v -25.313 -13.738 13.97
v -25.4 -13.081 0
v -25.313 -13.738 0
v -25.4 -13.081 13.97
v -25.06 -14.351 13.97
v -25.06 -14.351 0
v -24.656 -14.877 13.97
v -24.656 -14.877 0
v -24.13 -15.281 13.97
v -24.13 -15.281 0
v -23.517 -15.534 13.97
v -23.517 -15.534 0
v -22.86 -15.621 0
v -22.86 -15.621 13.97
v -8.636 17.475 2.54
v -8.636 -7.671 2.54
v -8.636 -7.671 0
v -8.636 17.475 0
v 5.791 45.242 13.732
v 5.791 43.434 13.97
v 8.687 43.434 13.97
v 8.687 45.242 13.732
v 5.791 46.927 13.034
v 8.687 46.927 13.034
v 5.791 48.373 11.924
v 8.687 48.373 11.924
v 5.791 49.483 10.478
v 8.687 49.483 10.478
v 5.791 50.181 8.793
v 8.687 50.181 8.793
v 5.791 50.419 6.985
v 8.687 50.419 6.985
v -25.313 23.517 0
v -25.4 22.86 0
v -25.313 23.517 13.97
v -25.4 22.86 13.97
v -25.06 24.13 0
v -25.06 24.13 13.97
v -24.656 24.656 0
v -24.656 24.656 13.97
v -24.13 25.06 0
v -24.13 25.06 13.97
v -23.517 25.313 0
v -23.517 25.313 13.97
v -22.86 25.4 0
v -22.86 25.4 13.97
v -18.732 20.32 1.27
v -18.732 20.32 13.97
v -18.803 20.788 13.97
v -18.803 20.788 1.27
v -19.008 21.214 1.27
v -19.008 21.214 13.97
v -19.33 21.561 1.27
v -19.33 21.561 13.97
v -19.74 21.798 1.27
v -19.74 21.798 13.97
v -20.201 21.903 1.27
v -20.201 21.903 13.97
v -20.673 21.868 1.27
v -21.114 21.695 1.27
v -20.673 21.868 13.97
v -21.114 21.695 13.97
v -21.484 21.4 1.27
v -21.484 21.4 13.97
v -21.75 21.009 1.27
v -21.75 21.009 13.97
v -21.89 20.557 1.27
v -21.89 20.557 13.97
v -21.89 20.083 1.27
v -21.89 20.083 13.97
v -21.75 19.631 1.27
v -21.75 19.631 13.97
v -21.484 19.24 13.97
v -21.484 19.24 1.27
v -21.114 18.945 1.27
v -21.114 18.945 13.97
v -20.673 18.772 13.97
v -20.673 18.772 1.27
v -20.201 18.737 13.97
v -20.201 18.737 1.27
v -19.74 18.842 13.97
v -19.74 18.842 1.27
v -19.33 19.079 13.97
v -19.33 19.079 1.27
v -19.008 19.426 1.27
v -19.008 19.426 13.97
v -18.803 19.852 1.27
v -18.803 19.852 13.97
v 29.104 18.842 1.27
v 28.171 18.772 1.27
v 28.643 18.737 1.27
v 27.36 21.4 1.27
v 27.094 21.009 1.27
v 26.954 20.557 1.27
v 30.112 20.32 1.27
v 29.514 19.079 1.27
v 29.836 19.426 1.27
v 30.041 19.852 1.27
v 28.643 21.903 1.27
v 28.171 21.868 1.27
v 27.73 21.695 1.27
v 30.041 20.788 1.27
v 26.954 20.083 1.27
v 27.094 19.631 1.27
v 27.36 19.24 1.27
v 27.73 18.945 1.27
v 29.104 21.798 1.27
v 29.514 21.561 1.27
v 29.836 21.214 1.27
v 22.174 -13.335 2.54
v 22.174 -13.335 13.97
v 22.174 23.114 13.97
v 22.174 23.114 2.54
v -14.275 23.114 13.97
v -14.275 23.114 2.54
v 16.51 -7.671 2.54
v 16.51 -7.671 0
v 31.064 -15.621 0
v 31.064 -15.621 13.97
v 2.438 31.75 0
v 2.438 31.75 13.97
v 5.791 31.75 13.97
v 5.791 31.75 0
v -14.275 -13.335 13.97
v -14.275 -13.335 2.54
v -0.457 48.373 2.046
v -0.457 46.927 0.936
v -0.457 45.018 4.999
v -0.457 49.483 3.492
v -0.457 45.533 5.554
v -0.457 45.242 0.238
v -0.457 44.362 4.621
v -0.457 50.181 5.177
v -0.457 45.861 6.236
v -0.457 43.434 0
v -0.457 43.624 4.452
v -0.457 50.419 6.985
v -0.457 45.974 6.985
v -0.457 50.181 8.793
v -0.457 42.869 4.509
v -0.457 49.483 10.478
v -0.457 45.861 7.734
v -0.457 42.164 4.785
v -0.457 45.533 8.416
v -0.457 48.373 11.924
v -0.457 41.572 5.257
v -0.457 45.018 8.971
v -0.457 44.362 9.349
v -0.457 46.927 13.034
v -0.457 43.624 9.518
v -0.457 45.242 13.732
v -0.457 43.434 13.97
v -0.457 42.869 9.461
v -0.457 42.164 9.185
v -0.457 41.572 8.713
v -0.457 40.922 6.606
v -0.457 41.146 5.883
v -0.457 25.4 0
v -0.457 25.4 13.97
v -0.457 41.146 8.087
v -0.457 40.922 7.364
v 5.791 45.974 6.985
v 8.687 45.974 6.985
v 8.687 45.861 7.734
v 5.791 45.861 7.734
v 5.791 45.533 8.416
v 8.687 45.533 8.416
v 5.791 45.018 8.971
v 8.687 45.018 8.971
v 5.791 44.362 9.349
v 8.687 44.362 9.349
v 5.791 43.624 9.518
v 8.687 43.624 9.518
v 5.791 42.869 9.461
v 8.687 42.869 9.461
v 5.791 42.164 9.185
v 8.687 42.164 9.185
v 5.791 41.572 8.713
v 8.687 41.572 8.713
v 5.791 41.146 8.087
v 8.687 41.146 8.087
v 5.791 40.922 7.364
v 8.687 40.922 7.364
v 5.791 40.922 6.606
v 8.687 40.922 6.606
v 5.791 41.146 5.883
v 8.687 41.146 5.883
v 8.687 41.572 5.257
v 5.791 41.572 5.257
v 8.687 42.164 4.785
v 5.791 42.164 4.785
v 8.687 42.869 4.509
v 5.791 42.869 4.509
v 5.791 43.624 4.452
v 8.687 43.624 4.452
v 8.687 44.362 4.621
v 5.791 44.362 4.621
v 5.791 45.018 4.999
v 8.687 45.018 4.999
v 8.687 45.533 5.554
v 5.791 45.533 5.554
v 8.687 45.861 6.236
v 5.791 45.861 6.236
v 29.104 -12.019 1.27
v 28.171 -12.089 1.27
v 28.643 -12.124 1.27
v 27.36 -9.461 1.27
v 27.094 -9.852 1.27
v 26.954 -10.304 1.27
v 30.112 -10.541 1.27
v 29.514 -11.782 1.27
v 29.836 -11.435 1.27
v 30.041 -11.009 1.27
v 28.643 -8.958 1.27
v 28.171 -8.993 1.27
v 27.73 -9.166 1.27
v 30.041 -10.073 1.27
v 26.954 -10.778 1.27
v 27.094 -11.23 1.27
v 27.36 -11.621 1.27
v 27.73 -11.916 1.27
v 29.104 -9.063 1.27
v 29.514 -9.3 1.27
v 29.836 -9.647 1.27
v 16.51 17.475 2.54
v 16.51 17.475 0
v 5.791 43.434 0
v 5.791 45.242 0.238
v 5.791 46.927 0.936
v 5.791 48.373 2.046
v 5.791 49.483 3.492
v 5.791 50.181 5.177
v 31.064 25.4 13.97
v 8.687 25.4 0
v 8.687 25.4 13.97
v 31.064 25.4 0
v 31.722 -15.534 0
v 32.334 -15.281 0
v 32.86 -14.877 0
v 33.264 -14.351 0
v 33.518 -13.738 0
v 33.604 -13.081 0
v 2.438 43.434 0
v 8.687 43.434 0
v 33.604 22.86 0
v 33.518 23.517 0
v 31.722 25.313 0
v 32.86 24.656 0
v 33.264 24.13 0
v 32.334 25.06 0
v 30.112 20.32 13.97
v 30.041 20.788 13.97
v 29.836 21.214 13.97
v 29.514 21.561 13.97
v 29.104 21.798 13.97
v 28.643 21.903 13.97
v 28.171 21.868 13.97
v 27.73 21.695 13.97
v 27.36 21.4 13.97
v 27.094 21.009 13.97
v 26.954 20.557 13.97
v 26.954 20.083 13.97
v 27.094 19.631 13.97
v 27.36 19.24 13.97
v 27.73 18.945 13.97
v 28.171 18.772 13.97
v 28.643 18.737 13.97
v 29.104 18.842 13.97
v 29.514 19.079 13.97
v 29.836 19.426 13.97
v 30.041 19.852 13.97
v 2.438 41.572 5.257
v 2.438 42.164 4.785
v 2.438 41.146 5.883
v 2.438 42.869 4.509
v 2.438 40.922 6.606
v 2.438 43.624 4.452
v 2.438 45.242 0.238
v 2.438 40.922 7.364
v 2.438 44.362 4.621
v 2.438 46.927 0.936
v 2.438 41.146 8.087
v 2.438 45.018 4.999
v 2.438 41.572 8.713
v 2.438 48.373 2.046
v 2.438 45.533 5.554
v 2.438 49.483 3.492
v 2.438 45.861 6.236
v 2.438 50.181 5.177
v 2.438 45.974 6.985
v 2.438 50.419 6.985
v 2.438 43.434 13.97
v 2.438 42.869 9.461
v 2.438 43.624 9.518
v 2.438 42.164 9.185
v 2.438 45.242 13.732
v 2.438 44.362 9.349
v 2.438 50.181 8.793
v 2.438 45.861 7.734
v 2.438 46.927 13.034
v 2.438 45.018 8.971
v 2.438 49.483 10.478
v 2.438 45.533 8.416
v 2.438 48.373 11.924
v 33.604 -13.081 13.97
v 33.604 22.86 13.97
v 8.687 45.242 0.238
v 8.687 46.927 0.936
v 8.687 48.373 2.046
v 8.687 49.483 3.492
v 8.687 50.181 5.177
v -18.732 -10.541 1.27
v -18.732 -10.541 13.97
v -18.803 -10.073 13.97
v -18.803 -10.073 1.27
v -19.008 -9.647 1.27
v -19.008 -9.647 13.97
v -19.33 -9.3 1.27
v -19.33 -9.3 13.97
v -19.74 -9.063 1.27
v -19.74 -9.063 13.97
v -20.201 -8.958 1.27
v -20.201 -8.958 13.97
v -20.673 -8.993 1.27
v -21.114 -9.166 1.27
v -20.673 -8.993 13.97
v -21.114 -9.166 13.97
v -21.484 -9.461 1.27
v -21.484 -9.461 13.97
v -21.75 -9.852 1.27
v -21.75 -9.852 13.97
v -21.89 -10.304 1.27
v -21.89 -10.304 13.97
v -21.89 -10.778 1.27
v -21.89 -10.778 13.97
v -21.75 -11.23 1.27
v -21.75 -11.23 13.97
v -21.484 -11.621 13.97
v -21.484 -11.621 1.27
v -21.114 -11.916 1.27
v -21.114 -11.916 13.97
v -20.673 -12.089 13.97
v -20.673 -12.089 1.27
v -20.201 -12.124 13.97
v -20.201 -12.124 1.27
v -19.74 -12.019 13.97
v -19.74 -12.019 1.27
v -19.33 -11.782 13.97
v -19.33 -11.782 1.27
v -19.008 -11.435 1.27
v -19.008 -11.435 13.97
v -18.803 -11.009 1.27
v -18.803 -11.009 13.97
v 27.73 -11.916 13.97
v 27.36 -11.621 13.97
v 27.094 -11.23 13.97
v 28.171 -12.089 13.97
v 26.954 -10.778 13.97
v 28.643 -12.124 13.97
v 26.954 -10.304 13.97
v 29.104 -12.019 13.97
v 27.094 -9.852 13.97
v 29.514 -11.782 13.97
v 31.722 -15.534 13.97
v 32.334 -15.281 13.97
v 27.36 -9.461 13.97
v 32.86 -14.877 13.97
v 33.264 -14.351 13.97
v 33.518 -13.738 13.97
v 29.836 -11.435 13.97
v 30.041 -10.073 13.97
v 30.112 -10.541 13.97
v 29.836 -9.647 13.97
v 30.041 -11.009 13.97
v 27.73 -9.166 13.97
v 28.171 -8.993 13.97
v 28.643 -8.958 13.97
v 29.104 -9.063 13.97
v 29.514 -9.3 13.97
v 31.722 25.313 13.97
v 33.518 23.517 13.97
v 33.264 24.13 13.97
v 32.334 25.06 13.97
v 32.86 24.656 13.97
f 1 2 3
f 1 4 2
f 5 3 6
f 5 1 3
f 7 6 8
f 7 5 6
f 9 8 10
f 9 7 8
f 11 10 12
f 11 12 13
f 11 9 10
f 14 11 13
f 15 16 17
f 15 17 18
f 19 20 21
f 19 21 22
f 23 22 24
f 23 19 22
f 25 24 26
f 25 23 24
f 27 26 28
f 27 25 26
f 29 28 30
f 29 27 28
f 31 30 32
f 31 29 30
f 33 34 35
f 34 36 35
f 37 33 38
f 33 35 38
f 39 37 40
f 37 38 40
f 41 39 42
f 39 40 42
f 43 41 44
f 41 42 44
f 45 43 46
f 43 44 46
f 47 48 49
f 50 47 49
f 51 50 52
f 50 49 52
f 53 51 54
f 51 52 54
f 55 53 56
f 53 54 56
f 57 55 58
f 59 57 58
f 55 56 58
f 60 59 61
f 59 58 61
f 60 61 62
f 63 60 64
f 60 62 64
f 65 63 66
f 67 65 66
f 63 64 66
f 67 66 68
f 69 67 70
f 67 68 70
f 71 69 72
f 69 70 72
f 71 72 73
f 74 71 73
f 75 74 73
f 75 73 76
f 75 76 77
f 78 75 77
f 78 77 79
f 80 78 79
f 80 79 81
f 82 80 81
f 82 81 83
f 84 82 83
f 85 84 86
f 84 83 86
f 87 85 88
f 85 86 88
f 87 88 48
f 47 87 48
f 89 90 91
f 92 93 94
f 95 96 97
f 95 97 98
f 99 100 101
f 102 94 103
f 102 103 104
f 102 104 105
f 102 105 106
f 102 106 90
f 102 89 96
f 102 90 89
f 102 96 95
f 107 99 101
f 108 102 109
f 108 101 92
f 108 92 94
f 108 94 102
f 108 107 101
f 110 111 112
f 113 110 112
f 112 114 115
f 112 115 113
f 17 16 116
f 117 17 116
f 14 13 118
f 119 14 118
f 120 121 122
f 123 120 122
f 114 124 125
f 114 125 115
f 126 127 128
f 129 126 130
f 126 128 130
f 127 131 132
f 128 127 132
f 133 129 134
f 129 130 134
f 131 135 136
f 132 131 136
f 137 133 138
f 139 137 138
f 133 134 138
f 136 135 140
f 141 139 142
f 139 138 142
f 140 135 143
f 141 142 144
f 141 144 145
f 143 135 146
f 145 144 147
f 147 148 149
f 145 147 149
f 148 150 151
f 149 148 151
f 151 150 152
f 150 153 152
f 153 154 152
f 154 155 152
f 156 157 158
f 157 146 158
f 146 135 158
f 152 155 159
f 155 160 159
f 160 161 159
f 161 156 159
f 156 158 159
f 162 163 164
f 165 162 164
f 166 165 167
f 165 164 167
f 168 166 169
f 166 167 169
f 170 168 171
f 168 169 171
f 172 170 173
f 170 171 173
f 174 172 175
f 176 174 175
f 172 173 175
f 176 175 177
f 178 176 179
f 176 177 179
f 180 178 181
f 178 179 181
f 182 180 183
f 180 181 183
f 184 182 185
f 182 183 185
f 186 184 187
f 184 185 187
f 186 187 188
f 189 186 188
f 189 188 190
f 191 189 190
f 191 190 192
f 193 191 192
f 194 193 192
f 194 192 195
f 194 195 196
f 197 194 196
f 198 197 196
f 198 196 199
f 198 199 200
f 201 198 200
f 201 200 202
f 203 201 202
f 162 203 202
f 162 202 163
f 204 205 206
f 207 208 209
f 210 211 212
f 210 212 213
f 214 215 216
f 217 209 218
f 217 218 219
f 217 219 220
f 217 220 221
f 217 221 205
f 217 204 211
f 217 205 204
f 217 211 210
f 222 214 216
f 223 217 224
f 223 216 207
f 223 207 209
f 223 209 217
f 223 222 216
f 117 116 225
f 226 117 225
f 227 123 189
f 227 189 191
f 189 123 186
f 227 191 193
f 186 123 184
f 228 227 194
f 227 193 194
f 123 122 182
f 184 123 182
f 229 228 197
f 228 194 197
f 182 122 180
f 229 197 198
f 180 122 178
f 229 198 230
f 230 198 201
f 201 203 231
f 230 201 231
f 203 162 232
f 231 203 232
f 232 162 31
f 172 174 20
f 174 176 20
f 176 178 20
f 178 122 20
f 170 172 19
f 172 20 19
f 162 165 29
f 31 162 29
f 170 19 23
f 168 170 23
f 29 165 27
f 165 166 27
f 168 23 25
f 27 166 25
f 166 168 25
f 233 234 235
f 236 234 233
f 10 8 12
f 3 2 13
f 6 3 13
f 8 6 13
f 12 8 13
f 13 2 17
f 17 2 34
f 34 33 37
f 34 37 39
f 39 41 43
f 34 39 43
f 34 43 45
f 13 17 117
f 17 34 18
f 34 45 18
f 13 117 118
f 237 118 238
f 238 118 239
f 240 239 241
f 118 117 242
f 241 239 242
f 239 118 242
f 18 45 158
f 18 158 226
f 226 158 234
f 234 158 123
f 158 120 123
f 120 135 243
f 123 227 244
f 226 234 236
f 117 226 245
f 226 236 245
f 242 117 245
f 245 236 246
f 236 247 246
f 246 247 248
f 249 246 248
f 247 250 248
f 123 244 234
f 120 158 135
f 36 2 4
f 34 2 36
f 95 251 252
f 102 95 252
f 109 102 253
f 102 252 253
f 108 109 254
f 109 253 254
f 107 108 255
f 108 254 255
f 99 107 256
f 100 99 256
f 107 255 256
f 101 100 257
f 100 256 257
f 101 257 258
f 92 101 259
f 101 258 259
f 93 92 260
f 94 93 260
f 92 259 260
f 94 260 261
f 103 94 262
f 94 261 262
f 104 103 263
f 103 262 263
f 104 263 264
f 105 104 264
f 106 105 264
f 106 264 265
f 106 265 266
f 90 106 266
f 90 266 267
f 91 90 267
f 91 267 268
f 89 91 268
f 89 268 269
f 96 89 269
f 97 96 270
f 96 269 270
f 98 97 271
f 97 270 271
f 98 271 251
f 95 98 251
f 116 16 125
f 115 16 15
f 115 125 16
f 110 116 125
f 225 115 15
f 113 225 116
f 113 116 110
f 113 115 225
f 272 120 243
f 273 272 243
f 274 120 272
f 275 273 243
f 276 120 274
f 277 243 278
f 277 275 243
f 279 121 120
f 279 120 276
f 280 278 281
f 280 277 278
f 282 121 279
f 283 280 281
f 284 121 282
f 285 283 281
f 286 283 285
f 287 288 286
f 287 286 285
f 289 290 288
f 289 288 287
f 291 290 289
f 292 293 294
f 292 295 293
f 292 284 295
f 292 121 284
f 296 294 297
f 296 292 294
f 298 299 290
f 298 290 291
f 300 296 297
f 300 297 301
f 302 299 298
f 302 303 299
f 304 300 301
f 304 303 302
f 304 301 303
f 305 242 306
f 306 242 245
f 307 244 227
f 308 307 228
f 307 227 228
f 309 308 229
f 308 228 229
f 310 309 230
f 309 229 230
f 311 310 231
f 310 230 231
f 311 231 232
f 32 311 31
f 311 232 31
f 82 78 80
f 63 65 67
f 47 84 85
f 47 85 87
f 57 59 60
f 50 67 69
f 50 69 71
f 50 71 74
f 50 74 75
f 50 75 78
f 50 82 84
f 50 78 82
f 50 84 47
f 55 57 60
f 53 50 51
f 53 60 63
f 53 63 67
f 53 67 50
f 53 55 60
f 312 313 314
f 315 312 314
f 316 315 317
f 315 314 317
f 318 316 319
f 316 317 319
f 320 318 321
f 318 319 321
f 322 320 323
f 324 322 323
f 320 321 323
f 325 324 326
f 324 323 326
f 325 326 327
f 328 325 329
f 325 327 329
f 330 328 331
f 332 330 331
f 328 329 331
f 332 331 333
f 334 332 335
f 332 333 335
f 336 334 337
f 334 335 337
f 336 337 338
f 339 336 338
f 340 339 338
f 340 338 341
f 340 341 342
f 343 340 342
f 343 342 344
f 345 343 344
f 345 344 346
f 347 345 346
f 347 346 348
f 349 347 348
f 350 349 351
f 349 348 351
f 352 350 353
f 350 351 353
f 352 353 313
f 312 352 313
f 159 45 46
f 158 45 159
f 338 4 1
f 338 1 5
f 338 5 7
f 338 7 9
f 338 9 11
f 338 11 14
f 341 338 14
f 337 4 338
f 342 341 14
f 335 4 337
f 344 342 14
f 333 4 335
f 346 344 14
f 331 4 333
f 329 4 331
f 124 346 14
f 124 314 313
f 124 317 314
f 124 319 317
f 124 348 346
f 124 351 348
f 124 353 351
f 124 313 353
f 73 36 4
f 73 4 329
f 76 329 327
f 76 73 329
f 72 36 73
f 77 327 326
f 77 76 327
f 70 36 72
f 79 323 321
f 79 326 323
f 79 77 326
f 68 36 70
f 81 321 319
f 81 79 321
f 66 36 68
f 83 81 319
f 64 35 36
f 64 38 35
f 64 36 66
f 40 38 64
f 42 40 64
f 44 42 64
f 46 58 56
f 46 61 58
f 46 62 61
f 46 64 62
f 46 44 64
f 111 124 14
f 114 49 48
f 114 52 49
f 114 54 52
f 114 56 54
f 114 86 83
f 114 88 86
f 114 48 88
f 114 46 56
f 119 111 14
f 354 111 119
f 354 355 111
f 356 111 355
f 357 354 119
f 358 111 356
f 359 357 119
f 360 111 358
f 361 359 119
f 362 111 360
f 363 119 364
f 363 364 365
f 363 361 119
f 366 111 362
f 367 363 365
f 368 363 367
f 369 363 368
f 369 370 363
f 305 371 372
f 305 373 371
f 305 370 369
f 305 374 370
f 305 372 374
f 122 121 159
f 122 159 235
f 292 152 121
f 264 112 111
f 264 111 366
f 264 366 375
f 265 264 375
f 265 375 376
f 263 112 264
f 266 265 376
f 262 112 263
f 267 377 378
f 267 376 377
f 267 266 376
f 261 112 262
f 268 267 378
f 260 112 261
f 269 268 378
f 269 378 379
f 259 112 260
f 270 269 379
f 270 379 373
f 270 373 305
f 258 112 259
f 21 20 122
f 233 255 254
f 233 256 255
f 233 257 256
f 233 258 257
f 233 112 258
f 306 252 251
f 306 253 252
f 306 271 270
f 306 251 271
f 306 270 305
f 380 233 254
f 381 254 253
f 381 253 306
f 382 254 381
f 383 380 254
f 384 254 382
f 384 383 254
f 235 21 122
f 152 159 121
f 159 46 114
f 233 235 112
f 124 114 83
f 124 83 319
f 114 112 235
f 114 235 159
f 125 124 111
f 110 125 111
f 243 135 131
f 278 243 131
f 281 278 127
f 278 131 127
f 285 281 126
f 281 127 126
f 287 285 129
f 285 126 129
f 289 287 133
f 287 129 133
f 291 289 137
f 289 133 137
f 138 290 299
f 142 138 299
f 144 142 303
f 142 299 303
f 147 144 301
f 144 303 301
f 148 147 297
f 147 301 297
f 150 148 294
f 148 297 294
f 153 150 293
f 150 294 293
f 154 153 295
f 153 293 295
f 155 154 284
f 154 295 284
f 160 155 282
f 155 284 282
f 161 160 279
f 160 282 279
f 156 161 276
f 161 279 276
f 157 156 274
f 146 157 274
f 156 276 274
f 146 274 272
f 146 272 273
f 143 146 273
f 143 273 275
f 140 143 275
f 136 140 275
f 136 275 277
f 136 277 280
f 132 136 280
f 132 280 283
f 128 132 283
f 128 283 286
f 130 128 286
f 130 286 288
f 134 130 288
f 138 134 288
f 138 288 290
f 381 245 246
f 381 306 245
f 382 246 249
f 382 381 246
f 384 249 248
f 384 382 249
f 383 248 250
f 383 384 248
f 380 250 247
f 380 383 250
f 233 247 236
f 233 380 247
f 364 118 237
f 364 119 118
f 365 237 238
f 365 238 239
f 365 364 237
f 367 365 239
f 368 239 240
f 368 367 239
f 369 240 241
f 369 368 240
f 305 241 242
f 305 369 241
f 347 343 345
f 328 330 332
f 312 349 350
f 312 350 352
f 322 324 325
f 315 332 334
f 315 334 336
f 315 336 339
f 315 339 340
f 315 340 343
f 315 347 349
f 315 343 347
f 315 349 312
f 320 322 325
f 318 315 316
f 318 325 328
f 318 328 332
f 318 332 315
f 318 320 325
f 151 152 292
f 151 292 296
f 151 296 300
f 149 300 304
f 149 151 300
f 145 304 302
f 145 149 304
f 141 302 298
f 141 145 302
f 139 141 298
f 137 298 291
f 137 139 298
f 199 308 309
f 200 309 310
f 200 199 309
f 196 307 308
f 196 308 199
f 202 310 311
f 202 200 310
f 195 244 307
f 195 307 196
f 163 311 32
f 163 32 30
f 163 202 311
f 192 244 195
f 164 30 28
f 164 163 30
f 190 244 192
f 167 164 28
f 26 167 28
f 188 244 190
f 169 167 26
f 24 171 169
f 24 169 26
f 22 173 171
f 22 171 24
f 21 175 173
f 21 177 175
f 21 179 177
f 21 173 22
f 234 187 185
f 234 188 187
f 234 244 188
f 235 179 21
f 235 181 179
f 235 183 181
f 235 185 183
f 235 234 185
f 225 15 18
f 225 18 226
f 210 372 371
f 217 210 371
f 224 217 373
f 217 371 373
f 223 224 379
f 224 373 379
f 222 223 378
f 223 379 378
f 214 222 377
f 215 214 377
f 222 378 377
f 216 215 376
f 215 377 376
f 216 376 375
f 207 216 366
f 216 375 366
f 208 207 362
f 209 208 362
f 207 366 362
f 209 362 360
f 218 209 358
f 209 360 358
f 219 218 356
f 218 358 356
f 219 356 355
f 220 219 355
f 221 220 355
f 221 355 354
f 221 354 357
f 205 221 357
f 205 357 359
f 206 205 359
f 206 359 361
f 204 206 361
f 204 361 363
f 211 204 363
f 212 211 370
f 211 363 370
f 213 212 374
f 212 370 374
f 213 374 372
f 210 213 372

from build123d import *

# Parameters (mm, degrees)
F0_W      = 59.0042
F0_H      = 41.021
F1_DEPTH  = 13.97
F2_R      = 2.54
F3_W      = 36.449
F3_H      = 36.449
F4_DEPTH  = 11.43
F5_W      = 25.146
F5_H      = 25.146
F6_DEPTH  = 2.541
F7_R      = 1.5875
F8_DEPTH  = 12.7
F9_W      = 9.144
F9_H      = 13.97
F10_DEPTH = 25.019
F11_R     = 6.98499
F12_W     = 3.3528
F12_H     = 22.225
F13_DEPTH = 13.971
F14_R     = 2.54
F15_DEPTH = 34.0878


# Not quite as in the source:
# - a fillet or chamfer is up to 0.001 mm smaller than in the source, because OpenCascade refuses the exact size


with BuildPart() as f1:
    # F0 (on Top) → F1 (new body)
    with BuildSketch(Plane.XY):
        with Locations((4.1021, 4.8895)):
            Rectangle(F0_W, F0_H)
    extrude(amount=F1_DEPTH)

    # F2
    f2_edges = [f1.edges().sort_by_distance(p)[0] for p in [
        (-25.4, 25.4, 6.985),
        (33.6042, 25.4, 6.985),
        (33.6042, -15.621, 6.985),
        (-25.4, -15.621, 6.985),
    ]]
    fillet(f2_edges, radius=F2_R)

    # F3 (on face) → F4 (cut)
    with BuildSketch(Plane.XY.offset(13.97)):
        with Locations((3.9497, 4.8895)):
            Rectangle(F3_W, F3_H)
    extrude(amount=-F4_DEPTH, mode=Mode.SUBTRACT)

    # F5 (on face) → F6 (cut, through all)
    with BuildSketch(Plane.XY.offset(2.54)):
        with Locations((3.937, 4.9022)):
            Rectangle(F5_W, F5_H)
    extrude(amount=-F6_DEPTH, mode=Mode.SUBTRACT)

    # F7 (on face) → F8 (cut)
    with BuildSketch(Plane.XY.offset(13.97)):
        with Locations((-20.32, 20.32)):
            Circle(F7_R)
        with Locations((-20.32, -10.541)):
            Circle(F7_R)
        with Locations((28.5242, 20.32)):
            Circle(F7_R)
        with Locations((28.5242, -10.541)):
            Circle(F7_R)
    extrude(amount=-F8_DEPTH, mode=Mode.SUBTRACT)

    # F9 (on face) → F10 (join)
    with BuildSketch(Plane(origin=(0, 25.4, 0), x_dir=(-1, 0, 0), z_dir=(0, 1, 0))):
        with Locations((-4.1148, 6.985)):
            Rectangle(F9_W, F9_H)
    extrude(amount=F10_DEPTH)

    # F11 (radius 6.985 in the source; OpenCascade refuses exactly that, so slightly less here)
    f11_edges = [f1.edges().sort_by_distance(p)[0] for p in [
        (4.1148, 50.419, 13.97),
        (4.1148, 50.419, 0),
    ]]
    fillet(f11_edges, radius=F11_R)

    # F12 (on face) → F13 (cut, through all)
    with BuildSketch(Plane.XY.offset(13.97)):
        with Locations((4.1148, 42.8625)):
            Rectangle(F12_W, F12_H)
    extrude(amount=-F13_DEPTH, mode=Mode.SUBTRACT)

    # F14 (on face) → F15 (cut, through all)
    with BuildSketch(Plane.YZ.offset(8.6868)):
        with Locations((43.434, 6.985)):
            Circle(F14_R)
    extrude(amount=-F15_DEPTH, mode=Mode.SUBTRACT)


solid = f1.part
